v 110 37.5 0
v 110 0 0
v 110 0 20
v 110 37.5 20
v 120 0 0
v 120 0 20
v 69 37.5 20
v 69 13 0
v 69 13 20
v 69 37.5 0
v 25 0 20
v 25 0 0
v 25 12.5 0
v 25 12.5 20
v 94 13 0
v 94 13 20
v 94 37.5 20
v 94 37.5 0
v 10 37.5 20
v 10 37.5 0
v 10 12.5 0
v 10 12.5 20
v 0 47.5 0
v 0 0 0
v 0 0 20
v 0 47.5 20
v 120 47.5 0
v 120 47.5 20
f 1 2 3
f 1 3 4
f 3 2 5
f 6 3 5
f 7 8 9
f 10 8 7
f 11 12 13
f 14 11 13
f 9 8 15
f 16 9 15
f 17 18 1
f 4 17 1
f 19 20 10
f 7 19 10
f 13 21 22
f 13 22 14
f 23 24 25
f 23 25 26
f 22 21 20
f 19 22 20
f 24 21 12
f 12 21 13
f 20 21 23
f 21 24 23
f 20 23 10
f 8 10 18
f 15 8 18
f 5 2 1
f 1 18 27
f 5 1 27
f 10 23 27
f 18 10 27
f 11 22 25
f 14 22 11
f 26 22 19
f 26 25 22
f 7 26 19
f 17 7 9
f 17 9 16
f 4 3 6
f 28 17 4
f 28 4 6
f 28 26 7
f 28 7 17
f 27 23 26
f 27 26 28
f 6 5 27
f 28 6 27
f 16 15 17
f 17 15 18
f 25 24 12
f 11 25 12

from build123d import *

# Parameters (mm, degrees)
BOX003_W     = 85
BOX003_H     = 13
BOX003_DEPTH = 20
BOX002_W     = 16
BOX002_H     = 25
BOX002_DEPTH = 20
BOX001_W     = 59
BOX001_H     = 25
BOX001_DEPTH = 20
BOX_W        = 120
BOX_H        = 47.5
BOX_DEPTH    = 20


with BuildPart() as cube003:
    # Box003 → Box003 (new body)
    with BuildSketch(Plane(origin=(25, 0, 0), x_dir=(1, 0, 0), z_dir=(0, 0, 1))):
        with Locations((42.5, 6.5)):
            Rectangle(BOX003_W, BOX003_H)
    extrude(amount=BOX003_DEPTH)


with BuildPart() as cube002:
    # Box002 → Box002 (new body)
    with BuildSketch(Plane(origin=(94, 12.5, 0), x_dir=(1, 0, 0), z_dir=(0, 0, 1))):
        with Locations((8, 12.5)):
            Rectangle(BOX002_W, BOX002_H)
    extrude(amount=BOX002_DEPTH)


with BuildPart() as cube001:
    # Box001 → Box001 (new body)
    with BuildSketch(Plane(origin=(10, 12.5, 0), x_dir=(1, 0, 0), z_dir=(0, 0, 1))):
        with Locations((29.5, 12.5)):
            Rectangle(BOX001_W, BOX001_H)
    extrude(amount=BOX001_DEPTH)


with BuildPart() as cut002:
    # Box → Box (new body)
    with BuildSketch(Plane.XY):
        with Locations((60, 23.75)):
            Rectangle(BOX_W, BOX_H)
    extrude(amount=BOX_DEPTH)

    # Cut: cut Cube001
    add(cube001.part, mode=Mode.SUBTRACT)

    # Cut001: cut Cube002
    add(cube002.part, mode=Mode.SUBTRACT)

    # Cut002: cut Cube003
    add(cube003.part, mode=Mode.SUBTRACT)


solid = cut002.part
